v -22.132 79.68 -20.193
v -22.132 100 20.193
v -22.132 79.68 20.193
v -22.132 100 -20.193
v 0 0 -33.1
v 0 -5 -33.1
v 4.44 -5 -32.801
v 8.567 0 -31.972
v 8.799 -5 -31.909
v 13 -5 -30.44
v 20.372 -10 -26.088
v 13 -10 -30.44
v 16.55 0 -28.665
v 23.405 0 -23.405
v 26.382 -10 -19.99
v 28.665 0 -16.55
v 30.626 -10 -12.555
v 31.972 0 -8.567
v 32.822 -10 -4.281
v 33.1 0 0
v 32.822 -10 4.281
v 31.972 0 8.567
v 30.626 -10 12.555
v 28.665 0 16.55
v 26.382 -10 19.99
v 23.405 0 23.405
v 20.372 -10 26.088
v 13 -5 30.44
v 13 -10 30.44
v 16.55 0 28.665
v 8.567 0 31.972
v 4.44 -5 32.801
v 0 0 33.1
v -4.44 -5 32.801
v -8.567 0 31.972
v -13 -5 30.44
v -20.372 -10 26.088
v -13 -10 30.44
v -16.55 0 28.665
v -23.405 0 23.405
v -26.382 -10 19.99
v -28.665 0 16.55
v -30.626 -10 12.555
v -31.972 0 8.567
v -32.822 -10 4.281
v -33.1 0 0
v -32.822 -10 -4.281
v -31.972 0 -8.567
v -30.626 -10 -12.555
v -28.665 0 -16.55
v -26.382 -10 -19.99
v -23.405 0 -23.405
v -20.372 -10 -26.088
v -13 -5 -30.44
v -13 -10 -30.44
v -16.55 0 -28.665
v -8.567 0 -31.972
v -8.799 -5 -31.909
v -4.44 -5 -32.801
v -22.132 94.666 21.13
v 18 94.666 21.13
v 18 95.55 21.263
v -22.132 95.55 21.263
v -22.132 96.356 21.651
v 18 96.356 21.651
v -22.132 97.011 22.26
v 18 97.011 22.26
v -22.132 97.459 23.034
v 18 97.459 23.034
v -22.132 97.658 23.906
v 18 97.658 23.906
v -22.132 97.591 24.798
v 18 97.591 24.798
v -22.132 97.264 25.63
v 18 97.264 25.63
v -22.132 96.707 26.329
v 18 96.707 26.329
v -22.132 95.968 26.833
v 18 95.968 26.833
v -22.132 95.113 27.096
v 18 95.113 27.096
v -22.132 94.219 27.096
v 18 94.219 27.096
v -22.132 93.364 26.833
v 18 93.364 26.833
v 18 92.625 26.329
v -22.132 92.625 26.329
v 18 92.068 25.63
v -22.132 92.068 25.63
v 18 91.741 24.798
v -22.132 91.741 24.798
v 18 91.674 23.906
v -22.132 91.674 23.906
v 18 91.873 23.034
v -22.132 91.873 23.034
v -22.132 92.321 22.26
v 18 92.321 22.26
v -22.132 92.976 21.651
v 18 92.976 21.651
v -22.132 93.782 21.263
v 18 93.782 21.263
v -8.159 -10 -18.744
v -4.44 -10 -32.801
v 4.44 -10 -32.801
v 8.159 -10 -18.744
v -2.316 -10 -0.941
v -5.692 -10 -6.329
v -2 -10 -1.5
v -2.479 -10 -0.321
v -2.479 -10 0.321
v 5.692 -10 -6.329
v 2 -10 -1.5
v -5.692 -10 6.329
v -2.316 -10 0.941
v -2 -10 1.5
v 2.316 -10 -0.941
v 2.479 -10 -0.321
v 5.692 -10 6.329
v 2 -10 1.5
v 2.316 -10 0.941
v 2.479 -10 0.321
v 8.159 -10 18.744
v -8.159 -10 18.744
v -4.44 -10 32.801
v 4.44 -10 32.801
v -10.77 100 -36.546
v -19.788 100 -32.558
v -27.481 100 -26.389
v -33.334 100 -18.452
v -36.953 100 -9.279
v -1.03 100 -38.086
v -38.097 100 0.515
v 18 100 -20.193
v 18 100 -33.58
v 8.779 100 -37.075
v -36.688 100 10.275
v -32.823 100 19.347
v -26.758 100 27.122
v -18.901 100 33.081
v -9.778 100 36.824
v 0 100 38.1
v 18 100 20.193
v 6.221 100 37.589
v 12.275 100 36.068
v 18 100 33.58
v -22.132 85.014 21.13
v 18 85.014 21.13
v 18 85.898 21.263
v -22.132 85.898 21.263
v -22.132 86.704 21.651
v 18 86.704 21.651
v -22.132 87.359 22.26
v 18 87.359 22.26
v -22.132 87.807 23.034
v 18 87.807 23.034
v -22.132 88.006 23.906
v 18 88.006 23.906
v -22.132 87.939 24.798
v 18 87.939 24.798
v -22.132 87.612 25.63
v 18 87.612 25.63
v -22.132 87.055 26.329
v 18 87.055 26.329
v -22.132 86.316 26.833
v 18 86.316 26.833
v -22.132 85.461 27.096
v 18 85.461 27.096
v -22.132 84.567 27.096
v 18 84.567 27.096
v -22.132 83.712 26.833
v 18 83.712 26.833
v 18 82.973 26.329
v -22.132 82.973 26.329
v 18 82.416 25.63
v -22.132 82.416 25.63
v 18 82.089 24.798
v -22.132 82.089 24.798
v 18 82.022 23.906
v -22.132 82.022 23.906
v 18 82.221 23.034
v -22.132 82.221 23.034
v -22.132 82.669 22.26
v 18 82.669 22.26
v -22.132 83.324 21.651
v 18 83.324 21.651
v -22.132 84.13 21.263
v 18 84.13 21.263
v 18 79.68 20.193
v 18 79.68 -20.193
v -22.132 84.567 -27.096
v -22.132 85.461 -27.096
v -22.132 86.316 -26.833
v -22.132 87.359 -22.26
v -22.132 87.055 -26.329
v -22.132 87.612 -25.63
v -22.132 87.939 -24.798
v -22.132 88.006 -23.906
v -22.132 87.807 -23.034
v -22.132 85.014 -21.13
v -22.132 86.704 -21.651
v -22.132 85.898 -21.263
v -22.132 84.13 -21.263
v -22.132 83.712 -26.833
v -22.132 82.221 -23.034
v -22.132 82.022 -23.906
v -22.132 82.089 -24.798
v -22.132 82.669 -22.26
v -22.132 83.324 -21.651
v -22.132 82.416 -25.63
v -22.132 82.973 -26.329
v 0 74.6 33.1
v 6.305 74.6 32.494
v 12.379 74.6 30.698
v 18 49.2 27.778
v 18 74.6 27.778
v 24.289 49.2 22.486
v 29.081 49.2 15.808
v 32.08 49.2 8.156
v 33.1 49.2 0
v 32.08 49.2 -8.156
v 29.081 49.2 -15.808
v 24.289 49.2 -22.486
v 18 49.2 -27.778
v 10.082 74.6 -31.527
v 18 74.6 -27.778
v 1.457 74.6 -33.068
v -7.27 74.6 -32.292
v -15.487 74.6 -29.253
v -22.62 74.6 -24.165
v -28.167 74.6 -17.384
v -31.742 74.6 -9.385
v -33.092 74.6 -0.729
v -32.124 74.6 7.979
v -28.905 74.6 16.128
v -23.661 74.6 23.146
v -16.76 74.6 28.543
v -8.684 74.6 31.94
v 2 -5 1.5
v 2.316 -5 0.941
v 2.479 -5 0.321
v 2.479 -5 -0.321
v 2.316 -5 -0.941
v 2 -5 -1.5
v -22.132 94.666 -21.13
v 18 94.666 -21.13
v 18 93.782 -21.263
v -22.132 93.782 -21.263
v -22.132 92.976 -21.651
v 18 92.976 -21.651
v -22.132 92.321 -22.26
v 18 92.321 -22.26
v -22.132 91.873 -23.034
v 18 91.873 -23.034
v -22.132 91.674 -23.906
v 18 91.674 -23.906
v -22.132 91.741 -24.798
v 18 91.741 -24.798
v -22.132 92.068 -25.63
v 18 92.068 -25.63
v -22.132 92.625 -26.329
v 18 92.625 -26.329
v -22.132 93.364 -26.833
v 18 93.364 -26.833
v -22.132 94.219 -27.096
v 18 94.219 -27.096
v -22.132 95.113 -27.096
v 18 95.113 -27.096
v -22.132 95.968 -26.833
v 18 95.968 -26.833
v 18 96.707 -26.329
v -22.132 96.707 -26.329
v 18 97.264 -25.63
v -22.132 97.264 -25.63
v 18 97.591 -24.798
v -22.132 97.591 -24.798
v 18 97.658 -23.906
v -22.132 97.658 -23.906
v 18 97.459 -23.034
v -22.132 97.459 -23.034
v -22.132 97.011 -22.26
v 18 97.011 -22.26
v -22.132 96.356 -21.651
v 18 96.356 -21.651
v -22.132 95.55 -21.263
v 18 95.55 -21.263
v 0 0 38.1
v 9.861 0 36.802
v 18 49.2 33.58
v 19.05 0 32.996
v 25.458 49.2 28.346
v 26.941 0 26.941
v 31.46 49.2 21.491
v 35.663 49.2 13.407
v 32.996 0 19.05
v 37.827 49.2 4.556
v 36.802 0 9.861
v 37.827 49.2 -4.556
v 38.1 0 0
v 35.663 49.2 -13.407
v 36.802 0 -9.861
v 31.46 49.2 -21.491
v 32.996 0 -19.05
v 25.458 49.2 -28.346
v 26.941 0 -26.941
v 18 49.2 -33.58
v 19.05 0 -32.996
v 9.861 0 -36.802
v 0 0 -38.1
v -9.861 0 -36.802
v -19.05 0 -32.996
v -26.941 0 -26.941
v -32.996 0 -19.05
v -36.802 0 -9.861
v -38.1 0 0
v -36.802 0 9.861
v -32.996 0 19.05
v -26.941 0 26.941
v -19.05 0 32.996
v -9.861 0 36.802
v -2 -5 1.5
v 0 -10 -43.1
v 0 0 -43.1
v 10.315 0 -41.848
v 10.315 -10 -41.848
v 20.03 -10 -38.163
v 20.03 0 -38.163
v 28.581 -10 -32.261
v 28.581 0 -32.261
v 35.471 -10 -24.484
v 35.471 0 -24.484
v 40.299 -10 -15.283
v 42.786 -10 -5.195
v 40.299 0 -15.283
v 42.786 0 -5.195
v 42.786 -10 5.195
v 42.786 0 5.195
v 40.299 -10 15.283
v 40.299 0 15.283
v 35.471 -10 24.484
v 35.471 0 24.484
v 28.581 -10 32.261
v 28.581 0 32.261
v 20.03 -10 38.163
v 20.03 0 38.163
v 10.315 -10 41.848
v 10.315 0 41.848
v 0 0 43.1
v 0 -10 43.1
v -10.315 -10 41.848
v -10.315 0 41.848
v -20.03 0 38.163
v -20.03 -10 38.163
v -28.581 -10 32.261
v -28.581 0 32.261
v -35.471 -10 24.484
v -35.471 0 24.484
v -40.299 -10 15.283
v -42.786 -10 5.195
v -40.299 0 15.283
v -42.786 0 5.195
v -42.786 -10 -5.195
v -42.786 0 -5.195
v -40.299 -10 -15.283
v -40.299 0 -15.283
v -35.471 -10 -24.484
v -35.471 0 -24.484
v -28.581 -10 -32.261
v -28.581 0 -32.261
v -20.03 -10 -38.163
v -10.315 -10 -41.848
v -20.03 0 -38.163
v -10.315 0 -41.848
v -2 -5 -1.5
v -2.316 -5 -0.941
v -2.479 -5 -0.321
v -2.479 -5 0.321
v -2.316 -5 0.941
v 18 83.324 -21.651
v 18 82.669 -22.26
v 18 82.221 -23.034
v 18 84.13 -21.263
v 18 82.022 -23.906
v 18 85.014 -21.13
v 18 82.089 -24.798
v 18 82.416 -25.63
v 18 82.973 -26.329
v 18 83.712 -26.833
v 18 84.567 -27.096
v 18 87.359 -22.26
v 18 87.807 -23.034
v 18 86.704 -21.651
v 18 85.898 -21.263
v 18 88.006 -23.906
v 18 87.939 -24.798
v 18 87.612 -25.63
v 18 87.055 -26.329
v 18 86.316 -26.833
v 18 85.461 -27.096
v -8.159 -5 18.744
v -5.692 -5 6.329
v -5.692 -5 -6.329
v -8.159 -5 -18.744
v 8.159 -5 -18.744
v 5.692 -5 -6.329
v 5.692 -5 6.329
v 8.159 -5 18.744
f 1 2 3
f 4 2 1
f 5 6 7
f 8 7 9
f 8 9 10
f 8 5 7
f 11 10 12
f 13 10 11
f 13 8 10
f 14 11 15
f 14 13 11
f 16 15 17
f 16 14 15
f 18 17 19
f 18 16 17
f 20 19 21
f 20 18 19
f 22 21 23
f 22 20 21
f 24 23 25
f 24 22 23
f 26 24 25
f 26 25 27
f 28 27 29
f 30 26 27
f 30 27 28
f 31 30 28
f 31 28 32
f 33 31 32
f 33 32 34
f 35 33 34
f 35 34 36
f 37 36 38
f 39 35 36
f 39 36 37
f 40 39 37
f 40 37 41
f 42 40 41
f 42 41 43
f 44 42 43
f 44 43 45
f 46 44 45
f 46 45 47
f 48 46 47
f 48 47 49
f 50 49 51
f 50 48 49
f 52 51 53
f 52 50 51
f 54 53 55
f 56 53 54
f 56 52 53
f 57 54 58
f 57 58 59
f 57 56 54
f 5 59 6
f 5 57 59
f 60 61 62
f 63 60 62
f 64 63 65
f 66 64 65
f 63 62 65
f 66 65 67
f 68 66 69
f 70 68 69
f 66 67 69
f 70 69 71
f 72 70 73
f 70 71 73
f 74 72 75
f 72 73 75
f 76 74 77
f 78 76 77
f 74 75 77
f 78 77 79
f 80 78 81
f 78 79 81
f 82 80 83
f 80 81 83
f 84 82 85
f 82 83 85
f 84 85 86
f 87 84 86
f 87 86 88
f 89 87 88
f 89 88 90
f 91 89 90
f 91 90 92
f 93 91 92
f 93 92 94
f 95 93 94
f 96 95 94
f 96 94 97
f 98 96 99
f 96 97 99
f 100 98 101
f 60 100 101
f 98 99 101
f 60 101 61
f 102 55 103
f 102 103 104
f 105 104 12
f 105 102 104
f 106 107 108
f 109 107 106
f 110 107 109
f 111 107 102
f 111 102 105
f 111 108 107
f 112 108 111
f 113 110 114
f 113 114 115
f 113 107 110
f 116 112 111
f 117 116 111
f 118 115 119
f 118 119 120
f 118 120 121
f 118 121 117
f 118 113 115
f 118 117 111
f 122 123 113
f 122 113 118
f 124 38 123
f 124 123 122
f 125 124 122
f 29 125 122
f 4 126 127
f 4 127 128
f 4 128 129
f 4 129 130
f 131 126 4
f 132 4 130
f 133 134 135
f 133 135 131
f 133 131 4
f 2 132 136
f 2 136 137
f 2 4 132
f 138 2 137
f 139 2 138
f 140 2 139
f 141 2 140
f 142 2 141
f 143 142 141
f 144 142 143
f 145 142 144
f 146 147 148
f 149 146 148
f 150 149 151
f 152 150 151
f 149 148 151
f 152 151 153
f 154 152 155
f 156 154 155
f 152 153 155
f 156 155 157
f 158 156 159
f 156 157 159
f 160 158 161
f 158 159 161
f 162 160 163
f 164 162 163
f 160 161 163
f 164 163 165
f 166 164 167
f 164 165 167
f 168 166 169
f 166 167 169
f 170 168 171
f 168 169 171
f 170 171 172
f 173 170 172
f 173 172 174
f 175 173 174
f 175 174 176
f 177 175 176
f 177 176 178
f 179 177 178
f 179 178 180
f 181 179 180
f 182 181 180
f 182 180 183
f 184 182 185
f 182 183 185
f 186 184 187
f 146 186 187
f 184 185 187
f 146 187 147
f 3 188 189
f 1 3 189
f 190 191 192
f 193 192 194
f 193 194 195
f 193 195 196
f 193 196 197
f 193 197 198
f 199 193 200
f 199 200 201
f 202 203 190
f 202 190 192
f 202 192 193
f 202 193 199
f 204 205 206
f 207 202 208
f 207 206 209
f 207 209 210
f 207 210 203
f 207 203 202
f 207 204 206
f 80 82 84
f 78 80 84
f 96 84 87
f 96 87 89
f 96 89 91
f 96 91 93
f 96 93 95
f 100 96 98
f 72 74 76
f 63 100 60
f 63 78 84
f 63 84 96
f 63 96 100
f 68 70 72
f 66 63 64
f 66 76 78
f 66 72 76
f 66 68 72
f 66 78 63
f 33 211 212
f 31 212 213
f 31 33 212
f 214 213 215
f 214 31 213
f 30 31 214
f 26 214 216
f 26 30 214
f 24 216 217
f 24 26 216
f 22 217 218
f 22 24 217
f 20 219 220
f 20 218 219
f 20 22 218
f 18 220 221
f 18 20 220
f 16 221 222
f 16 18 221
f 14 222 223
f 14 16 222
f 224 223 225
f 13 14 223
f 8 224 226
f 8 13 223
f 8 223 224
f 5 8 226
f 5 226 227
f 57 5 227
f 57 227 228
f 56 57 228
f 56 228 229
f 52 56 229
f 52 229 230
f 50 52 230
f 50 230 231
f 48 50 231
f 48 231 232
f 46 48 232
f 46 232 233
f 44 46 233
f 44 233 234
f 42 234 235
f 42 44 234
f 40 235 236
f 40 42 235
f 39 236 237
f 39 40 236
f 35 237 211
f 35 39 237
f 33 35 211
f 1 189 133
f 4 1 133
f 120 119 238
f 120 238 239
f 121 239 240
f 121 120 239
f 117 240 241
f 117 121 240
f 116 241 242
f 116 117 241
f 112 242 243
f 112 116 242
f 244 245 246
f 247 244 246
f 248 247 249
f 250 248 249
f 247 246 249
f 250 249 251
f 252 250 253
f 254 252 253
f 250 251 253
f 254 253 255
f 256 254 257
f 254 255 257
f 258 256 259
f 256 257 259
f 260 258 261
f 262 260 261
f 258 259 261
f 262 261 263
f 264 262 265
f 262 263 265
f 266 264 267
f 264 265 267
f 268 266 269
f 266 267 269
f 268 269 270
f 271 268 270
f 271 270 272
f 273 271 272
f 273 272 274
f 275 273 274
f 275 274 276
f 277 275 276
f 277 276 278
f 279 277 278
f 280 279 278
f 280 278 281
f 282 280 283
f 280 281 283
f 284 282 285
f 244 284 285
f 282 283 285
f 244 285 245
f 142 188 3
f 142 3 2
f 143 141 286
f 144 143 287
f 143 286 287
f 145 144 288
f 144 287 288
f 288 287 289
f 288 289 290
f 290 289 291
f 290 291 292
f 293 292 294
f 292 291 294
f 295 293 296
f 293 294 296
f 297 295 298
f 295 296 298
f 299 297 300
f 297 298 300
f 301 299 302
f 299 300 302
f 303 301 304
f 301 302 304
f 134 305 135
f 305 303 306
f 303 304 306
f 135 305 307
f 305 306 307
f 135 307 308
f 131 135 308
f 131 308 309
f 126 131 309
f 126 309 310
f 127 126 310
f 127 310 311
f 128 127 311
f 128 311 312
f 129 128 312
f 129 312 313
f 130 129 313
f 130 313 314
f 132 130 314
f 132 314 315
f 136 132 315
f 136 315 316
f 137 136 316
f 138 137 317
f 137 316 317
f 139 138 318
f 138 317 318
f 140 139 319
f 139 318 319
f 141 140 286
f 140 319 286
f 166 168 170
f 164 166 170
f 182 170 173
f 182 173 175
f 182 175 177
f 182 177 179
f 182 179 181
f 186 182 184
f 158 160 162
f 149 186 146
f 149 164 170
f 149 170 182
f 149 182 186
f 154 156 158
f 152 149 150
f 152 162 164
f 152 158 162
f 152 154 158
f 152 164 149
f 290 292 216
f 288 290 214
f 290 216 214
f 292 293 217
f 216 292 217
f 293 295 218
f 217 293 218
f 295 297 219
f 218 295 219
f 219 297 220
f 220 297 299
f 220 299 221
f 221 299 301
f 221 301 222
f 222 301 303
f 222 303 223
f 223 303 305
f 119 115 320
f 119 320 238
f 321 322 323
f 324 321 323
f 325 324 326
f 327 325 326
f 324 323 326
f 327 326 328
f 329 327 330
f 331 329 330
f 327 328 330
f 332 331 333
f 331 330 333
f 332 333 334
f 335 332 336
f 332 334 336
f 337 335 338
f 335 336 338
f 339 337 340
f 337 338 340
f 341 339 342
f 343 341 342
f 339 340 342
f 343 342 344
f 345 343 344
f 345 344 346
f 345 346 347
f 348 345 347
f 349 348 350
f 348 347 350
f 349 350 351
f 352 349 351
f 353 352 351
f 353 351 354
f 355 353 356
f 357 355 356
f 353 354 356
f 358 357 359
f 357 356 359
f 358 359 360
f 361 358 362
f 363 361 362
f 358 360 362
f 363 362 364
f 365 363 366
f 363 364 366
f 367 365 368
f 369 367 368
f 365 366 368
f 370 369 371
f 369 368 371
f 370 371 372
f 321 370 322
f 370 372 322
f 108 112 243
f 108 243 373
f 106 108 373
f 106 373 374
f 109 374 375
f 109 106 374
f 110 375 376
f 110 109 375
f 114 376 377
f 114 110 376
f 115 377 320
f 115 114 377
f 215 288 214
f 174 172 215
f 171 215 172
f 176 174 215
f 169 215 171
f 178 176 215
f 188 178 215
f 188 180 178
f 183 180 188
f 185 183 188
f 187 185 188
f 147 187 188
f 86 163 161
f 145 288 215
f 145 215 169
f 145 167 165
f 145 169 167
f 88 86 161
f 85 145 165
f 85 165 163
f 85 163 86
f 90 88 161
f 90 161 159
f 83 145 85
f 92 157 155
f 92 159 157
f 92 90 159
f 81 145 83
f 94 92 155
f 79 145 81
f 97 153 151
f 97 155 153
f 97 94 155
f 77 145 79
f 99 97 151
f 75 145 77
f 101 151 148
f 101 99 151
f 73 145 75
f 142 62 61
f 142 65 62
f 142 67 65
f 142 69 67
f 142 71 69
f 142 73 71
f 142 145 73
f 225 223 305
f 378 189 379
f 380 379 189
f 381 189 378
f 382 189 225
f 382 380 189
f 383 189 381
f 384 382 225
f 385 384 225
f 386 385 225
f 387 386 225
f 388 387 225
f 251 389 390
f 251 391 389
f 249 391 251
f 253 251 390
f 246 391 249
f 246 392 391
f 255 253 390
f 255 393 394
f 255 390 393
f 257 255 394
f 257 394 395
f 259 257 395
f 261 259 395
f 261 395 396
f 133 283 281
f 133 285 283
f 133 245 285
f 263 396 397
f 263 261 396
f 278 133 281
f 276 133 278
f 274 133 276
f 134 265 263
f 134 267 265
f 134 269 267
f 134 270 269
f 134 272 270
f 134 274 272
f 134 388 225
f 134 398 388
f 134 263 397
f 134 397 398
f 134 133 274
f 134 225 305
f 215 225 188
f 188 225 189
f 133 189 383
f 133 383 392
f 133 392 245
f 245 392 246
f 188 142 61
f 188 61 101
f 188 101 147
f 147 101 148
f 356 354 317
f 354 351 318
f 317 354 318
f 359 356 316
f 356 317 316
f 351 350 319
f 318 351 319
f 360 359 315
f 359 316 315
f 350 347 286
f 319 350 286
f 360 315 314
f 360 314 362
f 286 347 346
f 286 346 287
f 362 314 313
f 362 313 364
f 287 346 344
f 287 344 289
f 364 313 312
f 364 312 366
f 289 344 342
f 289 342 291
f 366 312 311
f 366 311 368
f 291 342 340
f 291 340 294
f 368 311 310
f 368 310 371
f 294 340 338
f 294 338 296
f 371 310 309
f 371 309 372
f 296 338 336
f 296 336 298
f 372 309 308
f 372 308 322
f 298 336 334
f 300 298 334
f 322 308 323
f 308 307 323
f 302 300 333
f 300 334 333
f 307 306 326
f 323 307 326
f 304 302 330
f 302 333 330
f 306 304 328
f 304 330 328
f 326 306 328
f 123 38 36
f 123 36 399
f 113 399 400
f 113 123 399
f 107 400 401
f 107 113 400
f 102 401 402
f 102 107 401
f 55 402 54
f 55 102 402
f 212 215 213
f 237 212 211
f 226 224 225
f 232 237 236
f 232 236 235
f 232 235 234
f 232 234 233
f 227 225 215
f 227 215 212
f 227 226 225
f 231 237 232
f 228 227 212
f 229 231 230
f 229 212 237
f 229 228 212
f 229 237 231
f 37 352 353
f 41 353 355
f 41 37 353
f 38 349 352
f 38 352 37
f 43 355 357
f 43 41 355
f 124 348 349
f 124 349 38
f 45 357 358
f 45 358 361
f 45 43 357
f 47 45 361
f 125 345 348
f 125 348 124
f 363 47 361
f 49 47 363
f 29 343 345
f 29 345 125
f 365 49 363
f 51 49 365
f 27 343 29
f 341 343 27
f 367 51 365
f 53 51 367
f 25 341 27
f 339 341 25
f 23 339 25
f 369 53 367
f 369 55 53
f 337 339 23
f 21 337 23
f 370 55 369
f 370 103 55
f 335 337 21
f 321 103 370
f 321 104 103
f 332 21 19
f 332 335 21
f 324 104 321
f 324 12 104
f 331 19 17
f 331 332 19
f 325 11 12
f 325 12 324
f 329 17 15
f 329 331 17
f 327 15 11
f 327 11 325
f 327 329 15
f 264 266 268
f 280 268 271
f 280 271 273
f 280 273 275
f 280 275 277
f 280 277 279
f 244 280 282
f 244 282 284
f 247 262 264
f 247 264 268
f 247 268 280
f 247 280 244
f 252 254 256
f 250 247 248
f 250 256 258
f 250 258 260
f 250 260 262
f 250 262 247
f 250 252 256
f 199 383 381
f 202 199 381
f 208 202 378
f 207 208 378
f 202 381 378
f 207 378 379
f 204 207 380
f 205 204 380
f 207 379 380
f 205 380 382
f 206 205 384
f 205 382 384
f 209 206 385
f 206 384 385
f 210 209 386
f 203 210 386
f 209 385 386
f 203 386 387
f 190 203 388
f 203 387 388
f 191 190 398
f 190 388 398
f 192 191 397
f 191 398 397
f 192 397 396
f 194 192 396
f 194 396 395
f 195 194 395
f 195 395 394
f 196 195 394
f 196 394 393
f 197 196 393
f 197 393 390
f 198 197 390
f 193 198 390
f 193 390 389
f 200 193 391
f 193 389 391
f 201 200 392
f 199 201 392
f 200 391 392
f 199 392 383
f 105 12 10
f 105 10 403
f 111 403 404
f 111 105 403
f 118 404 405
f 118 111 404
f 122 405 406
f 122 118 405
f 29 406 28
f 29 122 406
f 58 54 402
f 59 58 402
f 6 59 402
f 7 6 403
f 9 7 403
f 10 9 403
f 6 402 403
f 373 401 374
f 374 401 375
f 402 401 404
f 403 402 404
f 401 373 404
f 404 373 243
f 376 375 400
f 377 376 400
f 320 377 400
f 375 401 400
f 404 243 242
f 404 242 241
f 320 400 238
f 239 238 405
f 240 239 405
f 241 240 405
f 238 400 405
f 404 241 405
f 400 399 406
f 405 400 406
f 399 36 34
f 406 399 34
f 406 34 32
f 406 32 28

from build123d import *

# Parameters (mm, degrees)
SKETCH1_R           = 38.1
BOSS_EXTRUDE1_DEPTH = 100
SHELL1_T            = -5
SKETCH2_R           = 43.1
SKETCH2_R_2         = 33.1
BOSS_EXTRUDE2_DEPTH = 10
BOSS_EXTRUDE3_DEPTH = 5
CUT_EXTRUDE1_DEPTH  = 5
BOSS_EXTRUDE4_DEPTH = 25.4
CUT_EXTRUDE3_DEPTH  = 50.8
SKETCH9_R           = 3
SKETCH9_W           = 40.386
SKETCH9_H           = 20.32
CUT_EXTRUDE4_DEPTH  = 40.132


with BuildPart() as part:
    # Sketch1 → Boss-Extrude1 (new body)
    with BuildSketch(Plane(origin=(0, 0, 0), x_dir=(1, 0, 0), z_dir=(0, 1, 0))):
        with Locations(Location((0, 0, 0), (0, 0, 270))):
            Circle(SKETCH1_R)
    extrude(amount=BOSS_EXTRUDE1_DEPTH)

    # Shell1
    shell1_openings = [part.faces().sort_by_distance(p)[0] for p in [
        (0, 100, 0),
        (0, 0, 0),
    ]]
    offset(amount=SHELL1_T, openings=shell1_openings, kind=Kind.INTERSECTION)

    # Sketch2 → Boss-Extrude2 (add)
    with BuildSketch(Plane.XZ):
        with Locations(Location((0, 0, 0), (0, 0, 270))):
            Circle(SKETCH2_R)
        with Locations(Location((0, 0, 0), (0, 0, 270))):
            Circle(SKETCH2_R_2, mode=Mode.SUBTRACT)
    extrude(amount=BOSS_EXTRUDE2_DEPTH)

    # Sketch4 → Boss-Extrude3 (add)
    with BuildSketch(Plane.XZ.offset(10)):
        with BuildLine():
            ThreePointArc((-13, 30.440269381), (-5.381039934, 0), (-13, -30.440269381))
            ThreePointArc((-13, -30.440269381), (0, -33.1), (13, -30.440269381))
            ThreePointArc((13, -30.440269381), (5.381039934, 0), (13, 30.440269381))
            ThreePointArc((13, 30.440269381), (0, 33.1), (-13, 30.440269381))
        make_face()
    extrude(amount=-BOSS_EXTRUDE3_DEPTH)

    # Sketch5 → Cut-Extrude1 (cut)
    with BuildSketch(Plane.XZ.offset(10)):
        with BuildLine():
            Line((-2, 1.5), (2, 1.5))
            ThreePointArc((2, 1.5), (2.5, 0), (2, -1.5))
            Line((2, -1.5), (-2, -1.5))
            ThreePointArc((-2, -1.5), (-2.5, 0), (-2, 1.5))
        make_face()
    extrude(amount=-CUT_EXTRUDE1_DEPTH, mode=Mode.SUBTRACT)

    # Sketch6 → Boss-Extrude4 (add)
    with BuildSketch(Plane(origin=(0, 100, 0), x_dir=(1, 0, 0), z_dir=(0, 1, 0))):
        with BuildLine():
            Line((18, 33.579904705), (18, -33.579904705))
            ThreePointArc((18, -33.579904705), (-38.1, 0), (18, 33.579904705))
        make_face()
    extrude(amount=-BOSS_EXTRUDE4_DEPTH)

    # Sketch8 → Cut-Extrude3 (cut)
    with BuildSketch(Plane(origin=(0, 100, 0), x_dir=(1, 0, 0), z_dir=(0, 1, 0))):
        with BuildLine():
            Line((18, -42.955320998), (18, 42.955320998))
            ThreePointArc((18, 42.955320998), (52.271949939, 0), (18, -42.955320998))
        make_face()
    extrude(amount=-CUT_EXTRUDE3_DEPTH, mode=Mode.SUBTRACT)

    # Sketch9 → Cut-Extrude4 (cut)
    with BuildSketch(Plane(origin=(18, 0, 0), x_dir=(0, 0, -1), z_dir=(1, 0, 0))):
        with Locations((-24.13, 94.666)):
            Circle(SKETCH9_R)
        with Locations((-24.13, 85.014)):
            Circle(SKETCH9_R)
        with Locations(Location((24.13, 85.014, 0), (0, 0, 180))):
            Circle(SKETCH9_R)
        with Locations(Location((24.13, 94.666, 0), (0, 0, 180))):
            Circle(SKETCH9_R)
        with Locations((0, 89.84)):
            Rectangle(SKETCH9_W, SKETCH9_H)
    extrude(amount=-CUT_EXTRUDE4_DEPTH, mode=Mode.SUBTRACT)


solid = part.part
